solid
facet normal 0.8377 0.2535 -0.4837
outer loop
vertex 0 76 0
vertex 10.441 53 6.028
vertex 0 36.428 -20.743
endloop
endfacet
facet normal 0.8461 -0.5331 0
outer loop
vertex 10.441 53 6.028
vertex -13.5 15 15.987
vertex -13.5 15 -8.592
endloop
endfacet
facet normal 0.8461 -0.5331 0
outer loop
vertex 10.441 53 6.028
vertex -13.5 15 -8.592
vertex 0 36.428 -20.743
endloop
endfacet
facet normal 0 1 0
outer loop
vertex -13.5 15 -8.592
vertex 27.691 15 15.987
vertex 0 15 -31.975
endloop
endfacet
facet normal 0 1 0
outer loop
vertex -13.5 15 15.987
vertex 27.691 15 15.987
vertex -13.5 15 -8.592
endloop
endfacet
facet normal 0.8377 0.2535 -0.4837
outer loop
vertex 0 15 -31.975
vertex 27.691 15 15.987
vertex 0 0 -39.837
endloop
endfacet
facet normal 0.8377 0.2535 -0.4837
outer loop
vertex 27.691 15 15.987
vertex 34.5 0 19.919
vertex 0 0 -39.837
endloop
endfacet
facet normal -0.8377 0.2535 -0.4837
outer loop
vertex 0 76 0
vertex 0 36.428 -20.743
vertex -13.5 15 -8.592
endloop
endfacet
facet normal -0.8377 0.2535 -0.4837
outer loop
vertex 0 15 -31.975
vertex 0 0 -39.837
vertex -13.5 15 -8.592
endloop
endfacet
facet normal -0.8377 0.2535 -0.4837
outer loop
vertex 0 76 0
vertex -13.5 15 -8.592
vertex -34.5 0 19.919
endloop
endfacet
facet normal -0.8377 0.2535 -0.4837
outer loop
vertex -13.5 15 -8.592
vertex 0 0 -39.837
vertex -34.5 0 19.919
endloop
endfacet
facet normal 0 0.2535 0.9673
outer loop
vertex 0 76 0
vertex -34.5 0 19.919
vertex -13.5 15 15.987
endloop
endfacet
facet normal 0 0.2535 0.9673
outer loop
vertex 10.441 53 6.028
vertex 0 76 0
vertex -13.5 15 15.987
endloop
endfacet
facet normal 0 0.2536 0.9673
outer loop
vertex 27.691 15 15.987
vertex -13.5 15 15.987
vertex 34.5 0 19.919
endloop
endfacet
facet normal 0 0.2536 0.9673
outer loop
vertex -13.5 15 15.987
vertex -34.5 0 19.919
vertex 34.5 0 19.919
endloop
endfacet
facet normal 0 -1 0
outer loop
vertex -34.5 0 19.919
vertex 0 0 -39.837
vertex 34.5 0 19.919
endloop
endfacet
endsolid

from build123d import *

# Parameters (mm, degrees)
CUT_EXTRUDE_2_DEPTH = 38


with BuildPart() as part:
    # 草图1 → 放样3 section 0
    with BuildSketch(Plane(origin=(0, 0, 0), x_dir=(1, 0, 0), z_dir=(0, 1, 0)), mode=Mode.PRIVATE) as loft_3_s0:
        Polygon((0, 39.837168574), (-34.5, -19.918584287), (34.5, -19.918584287), align=None)
    loft([Vertex(0, 76, 0), loft_3_s0.sketch])

    # 草图11 → 切除-拉伸2 (cut, symmetric)
    with BuildSketch(Plane.XY):
        Polygon((10.440789474, 53), (27.690789474, 15), (-13.5, 15), align=None)
    extrude(amount=CUT_EXTRUDE_2_DEPTH, both=True, mode=Mode.SUBTRACT)


solid = part.part
